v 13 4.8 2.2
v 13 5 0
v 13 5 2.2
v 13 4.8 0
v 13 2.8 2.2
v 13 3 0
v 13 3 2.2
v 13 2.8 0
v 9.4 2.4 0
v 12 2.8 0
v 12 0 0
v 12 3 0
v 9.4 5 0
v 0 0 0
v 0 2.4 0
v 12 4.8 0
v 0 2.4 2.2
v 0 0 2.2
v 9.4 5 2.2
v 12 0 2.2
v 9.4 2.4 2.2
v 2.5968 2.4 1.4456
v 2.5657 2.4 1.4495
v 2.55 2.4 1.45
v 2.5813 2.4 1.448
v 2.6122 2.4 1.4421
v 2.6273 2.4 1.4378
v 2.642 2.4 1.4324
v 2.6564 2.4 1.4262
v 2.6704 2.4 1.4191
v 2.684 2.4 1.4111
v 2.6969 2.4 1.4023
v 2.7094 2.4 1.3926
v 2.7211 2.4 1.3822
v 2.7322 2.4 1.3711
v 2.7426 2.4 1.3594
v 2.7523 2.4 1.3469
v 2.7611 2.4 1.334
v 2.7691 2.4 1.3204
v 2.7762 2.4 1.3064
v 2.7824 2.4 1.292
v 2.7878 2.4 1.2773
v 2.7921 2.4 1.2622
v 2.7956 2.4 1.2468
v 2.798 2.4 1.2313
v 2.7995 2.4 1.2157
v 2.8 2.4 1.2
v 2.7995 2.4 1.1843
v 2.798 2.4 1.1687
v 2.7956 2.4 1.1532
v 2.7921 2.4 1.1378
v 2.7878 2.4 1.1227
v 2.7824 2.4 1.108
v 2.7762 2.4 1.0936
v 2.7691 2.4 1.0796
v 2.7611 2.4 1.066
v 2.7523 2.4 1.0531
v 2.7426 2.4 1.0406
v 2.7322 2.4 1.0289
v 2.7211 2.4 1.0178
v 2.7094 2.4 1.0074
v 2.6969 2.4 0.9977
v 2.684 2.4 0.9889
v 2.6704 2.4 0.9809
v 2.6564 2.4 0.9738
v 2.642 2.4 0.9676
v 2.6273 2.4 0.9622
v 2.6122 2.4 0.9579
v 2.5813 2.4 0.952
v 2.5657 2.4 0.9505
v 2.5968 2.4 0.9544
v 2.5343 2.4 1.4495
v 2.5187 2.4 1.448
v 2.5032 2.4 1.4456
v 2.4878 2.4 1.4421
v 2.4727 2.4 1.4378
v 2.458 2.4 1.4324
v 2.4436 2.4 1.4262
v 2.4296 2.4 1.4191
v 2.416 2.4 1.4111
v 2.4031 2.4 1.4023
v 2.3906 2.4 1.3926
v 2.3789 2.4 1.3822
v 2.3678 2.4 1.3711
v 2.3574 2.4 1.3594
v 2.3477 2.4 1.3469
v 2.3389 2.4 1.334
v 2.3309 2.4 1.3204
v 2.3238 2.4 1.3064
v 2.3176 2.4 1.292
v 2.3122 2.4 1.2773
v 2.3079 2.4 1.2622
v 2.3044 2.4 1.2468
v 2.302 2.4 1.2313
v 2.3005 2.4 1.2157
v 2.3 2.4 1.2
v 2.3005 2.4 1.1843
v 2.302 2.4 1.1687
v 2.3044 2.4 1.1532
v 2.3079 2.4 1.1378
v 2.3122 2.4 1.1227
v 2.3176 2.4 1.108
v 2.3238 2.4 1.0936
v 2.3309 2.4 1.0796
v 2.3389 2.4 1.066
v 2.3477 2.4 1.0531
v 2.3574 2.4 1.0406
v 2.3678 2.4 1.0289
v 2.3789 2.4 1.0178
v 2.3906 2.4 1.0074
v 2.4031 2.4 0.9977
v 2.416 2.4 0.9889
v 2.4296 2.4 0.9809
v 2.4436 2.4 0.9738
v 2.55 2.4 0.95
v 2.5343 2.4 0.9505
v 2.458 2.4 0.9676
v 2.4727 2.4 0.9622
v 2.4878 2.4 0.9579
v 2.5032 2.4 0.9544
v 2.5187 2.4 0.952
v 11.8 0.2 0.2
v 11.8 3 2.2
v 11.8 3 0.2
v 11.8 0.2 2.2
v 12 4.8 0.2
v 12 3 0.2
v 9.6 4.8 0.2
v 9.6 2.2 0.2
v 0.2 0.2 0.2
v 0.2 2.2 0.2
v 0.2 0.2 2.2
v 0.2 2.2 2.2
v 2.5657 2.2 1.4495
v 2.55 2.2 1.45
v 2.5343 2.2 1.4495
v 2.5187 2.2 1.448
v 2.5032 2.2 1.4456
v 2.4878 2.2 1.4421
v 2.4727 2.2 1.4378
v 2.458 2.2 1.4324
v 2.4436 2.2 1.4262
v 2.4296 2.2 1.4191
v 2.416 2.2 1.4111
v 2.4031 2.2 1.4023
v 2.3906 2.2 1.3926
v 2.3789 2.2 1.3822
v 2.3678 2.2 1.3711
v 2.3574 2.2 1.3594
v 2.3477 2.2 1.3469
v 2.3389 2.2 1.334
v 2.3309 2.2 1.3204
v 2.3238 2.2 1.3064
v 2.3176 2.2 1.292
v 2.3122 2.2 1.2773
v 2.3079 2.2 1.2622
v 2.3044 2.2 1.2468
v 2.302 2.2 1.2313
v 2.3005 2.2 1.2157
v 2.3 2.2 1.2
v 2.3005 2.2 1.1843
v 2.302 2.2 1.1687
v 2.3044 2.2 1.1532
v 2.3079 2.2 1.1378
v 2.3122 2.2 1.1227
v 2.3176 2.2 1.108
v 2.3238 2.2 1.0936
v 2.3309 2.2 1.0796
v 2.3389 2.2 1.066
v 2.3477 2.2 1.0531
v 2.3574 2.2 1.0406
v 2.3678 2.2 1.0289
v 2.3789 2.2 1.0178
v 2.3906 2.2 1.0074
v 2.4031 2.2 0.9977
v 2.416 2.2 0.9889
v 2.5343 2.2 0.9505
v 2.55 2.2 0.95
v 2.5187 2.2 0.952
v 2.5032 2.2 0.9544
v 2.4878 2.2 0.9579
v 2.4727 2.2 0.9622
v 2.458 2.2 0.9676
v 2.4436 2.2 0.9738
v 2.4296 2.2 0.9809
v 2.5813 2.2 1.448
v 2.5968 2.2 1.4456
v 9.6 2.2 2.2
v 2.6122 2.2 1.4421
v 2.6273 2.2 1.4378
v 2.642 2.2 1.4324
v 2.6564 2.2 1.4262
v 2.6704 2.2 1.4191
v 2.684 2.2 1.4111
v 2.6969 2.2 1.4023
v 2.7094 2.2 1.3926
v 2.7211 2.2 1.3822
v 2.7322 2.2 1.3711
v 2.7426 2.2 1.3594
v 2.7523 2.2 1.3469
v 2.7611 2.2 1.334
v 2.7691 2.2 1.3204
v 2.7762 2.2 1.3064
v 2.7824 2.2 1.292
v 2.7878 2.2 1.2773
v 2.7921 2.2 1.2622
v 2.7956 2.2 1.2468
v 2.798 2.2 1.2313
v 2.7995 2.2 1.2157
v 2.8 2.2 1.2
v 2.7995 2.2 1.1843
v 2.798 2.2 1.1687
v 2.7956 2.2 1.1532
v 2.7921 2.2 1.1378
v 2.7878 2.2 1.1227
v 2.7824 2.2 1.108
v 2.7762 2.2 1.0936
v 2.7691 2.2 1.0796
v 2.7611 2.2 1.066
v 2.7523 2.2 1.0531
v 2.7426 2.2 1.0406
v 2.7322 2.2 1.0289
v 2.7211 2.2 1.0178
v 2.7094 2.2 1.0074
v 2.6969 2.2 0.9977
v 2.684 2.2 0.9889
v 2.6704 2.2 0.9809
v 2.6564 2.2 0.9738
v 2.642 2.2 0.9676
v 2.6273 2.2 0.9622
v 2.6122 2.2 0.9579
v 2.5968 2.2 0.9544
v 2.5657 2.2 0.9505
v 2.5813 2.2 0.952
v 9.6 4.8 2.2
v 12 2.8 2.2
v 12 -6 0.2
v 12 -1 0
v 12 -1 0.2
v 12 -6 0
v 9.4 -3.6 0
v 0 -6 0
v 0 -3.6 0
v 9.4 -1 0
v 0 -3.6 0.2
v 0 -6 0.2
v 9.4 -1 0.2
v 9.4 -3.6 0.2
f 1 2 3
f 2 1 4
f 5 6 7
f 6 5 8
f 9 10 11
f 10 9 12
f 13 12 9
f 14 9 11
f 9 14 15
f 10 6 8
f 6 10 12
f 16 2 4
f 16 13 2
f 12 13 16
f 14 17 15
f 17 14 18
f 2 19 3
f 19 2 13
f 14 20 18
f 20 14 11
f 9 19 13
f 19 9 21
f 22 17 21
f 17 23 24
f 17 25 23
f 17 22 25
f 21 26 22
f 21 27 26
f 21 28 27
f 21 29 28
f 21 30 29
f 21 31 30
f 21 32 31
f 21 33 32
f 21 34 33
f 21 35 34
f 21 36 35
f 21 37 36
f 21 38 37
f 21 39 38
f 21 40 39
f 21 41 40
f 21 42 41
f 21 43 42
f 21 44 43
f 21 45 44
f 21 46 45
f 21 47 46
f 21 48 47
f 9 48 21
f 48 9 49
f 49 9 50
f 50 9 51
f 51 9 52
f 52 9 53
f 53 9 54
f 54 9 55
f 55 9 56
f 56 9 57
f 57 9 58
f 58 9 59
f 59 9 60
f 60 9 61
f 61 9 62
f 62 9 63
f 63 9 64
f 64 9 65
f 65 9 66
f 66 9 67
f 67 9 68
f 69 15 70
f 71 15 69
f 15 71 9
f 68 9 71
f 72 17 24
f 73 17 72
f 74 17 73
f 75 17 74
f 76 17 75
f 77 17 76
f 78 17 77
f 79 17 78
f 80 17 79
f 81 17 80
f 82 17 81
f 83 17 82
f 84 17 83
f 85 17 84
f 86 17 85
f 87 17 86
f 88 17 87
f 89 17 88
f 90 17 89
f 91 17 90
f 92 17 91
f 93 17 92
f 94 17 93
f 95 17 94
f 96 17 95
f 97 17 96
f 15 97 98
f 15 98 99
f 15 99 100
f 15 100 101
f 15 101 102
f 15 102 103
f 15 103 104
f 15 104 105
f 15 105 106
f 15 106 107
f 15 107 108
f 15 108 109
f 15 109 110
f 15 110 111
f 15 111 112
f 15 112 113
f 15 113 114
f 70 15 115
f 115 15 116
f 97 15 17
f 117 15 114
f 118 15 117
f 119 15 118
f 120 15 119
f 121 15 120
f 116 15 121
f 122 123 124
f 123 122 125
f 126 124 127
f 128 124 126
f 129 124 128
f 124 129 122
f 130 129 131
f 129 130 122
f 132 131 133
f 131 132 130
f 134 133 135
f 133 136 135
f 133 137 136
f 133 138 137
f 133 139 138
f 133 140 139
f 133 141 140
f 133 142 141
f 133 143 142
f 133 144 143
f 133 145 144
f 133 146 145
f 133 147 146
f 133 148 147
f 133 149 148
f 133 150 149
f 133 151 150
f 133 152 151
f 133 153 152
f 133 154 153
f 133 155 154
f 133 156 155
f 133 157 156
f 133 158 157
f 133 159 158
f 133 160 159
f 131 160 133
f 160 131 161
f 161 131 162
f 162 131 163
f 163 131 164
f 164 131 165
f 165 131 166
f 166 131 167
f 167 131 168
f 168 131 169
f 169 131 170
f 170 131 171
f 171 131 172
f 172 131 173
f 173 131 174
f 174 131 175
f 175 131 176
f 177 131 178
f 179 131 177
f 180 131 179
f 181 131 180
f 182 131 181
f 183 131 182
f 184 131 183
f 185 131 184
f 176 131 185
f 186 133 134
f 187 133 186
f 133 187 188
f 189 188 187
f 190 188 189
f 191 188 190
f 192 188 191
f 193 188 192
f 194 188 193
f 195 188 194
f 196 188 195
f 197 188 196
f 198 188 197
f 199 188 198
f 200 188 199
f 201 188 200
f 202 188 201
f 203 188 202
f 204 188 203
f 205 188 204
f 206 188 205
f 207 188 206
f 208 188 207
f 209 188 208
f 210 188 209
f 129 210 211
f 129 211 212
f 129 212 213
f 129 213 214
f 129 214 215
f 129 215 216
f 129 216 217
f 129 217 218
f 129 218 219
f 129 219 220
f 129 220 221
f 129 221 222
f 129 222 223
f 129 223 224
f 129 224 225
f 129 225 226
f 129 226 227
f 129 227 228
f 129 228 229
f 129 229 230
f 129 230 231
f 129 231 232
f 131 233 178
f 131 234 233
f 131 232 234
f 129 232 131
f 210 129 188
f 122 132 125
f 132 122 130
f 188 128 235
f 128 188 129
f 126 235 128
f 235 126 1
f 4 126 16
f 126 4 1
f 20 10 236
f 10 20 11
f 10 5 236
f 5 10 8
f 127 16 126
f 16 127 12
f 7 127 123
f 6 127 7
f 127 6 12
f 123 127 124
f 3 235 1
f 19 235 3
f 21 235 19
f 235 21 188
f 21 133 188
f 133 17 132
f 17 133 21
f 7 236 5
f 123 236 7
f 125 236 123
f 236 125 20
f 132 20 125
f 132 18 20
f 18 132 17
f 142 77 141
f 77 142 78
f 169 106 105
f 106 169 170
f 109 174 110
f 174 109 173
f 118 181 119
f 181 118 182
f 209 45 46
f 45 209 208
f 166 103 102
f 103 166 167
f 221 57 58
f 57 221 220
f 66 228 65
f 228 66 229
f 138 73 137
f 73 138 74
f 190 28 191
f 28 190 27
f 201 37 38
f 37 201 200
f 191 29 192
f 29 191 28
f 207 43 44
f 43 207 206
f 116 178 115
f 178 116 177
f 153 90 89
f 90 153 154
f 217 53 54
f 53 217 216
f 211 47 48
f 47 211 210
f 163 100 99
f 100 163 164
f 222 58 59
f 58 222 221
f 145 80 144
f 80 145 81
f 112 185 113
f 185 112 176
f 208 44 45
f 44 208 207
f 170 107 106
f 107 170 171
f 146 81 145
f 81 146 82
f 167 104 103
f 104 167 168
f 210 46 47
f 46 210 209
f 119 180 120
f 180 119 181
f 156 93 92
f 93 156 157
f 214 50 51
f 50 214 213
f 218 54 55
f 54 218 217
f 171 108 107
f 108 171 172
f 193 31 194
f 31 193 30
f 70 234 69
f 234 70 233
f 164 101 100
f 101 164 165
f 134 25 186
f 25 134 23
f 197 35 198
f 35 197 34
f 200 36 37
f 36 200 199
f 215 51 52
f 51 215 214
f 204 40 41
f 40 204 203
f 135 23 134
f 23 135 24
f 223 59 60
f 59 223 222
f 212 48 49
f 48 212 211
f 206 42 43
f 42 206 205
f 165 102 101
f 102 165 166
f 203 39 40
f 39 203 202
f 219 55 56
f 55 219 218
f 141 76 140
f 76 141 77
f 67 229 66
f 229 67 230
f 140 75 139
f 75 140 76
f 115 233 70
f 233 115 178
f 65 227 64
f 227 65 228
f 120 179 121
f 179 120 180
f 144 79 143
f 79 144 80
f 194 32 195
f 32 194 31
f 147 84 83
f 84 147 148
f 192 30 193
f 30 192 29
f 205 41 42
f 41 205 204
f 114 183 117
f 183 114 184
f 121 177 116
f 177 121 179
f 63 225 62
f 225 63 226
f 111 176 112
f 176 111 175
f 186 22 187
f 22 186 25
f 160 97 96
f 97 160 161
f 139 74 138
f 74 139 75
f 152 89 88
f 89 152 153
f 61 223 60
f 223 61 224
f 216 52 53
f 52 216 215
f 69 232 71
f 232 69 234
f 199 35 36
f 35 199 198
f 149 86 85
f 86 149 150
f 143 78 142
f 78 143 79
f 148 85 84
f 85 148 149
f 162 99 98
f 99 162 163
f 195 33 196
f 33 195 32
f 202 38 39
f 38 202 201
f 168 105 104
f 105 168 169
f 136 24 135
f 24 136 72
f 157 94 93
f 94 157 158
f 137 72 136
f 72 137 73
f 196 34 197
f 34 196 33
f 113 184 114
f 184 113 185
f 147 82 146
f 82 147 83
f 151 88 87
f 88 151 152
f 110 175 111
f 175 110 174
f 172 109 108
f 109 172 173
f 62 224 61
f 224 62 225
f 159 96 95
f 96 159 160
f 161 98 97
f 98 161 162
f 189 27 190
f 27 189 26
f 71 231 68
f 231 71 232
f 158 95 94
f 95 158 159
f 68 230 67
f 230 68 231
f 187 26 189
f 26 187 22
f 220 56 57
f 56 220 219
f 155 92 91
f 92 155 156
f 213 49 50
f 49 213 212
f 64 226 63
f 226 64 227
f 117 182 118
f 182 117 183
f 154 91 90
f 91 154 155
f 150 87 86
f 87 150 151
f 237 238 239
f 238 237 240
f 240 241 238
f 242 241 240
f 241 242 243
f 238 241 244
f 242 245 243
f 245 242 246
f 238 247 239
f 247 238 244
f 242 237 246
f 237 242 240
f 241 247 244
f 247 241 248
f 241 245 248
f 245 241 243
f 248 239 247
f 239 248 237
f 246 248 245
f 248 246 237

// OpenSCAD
difference() {
	
	cube([13, 5, 2.4]);
	
	translate([-0.1, 2.4, -0.5]) {
				cube([9.5, 5, 3]);
		}
		
	translate([0.2, 0.2, 0.2]) {
				cube([11.6, 2.0, 3]);
		}
		
	translate([9.6, 2.1, 0.2]) {
				cube([2.2, 2.7, 3]);
		}
		
	translate([12.0, -0.1, -0.1]) {
				cube([1.1, 2.9, 4]);
		} 

	translate([12, 3, -0.5]) {
				cube([3, 1.8, 4.5]);
		} 

	translate([11.6, 3, 0.2]) {
			cube([3, 1.8, 4.5]);
		}
	
	translate([-0.1, -0.1, 2.2]) {
				cube([14.1, 6, 4.5]);	
	}
	
	translate([2.55, 2.5, 1.2]) {
			rotate([90, 0,0]) {
				cylinder(r=0.25, h=1, $fn=100);
		}
	}
	
}



translate([0, -6, 0]) {
	difference() {
		
		cube([12, 5, 2.4]);
		
		translate([-0.1, 2.4, -0.5]) {
					cube([9.5, 5, 3]);
			}
		
		
		translate([-0.1, -0.1, 0.2]) {
					cube([26, 9, 3]);
			}
		
}
	
}
